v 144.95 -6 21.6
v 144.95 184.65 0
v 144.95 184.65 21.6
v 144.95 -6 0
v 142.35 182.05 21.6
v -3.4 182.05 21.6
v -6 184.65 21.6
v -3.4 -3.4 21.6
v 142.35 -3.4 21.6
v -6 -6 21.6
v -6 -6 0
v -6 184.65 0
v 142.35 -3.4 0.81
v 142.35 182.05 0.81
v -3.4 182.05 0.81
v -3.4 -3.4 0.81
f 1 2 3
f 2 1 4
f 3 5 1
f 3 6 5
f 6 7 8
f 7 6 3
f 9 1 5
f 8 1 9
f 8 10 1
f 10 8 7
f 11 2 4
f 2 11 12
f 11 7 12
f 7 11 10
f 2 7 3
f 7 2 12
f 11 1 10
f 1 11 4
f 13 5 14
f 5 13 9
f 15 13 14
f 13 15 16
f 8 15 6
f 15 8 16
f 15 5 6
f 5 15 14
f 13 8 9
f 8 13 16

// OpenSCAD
/*

  puzzle_lid.scad

  Winston Freer Tile Puzzle: Lid
      
  (c) olikraus@gmail.com

  This work is licensed under the Creative Commons Attribution-NonCommercial-ShareAlike 4.0 International License. 
  To view a copy of this license, visit http://creativecommons.org/licenses/by-nc-sa/4.0/.
    
*/

include <winston_freer.scad>;


lid();
